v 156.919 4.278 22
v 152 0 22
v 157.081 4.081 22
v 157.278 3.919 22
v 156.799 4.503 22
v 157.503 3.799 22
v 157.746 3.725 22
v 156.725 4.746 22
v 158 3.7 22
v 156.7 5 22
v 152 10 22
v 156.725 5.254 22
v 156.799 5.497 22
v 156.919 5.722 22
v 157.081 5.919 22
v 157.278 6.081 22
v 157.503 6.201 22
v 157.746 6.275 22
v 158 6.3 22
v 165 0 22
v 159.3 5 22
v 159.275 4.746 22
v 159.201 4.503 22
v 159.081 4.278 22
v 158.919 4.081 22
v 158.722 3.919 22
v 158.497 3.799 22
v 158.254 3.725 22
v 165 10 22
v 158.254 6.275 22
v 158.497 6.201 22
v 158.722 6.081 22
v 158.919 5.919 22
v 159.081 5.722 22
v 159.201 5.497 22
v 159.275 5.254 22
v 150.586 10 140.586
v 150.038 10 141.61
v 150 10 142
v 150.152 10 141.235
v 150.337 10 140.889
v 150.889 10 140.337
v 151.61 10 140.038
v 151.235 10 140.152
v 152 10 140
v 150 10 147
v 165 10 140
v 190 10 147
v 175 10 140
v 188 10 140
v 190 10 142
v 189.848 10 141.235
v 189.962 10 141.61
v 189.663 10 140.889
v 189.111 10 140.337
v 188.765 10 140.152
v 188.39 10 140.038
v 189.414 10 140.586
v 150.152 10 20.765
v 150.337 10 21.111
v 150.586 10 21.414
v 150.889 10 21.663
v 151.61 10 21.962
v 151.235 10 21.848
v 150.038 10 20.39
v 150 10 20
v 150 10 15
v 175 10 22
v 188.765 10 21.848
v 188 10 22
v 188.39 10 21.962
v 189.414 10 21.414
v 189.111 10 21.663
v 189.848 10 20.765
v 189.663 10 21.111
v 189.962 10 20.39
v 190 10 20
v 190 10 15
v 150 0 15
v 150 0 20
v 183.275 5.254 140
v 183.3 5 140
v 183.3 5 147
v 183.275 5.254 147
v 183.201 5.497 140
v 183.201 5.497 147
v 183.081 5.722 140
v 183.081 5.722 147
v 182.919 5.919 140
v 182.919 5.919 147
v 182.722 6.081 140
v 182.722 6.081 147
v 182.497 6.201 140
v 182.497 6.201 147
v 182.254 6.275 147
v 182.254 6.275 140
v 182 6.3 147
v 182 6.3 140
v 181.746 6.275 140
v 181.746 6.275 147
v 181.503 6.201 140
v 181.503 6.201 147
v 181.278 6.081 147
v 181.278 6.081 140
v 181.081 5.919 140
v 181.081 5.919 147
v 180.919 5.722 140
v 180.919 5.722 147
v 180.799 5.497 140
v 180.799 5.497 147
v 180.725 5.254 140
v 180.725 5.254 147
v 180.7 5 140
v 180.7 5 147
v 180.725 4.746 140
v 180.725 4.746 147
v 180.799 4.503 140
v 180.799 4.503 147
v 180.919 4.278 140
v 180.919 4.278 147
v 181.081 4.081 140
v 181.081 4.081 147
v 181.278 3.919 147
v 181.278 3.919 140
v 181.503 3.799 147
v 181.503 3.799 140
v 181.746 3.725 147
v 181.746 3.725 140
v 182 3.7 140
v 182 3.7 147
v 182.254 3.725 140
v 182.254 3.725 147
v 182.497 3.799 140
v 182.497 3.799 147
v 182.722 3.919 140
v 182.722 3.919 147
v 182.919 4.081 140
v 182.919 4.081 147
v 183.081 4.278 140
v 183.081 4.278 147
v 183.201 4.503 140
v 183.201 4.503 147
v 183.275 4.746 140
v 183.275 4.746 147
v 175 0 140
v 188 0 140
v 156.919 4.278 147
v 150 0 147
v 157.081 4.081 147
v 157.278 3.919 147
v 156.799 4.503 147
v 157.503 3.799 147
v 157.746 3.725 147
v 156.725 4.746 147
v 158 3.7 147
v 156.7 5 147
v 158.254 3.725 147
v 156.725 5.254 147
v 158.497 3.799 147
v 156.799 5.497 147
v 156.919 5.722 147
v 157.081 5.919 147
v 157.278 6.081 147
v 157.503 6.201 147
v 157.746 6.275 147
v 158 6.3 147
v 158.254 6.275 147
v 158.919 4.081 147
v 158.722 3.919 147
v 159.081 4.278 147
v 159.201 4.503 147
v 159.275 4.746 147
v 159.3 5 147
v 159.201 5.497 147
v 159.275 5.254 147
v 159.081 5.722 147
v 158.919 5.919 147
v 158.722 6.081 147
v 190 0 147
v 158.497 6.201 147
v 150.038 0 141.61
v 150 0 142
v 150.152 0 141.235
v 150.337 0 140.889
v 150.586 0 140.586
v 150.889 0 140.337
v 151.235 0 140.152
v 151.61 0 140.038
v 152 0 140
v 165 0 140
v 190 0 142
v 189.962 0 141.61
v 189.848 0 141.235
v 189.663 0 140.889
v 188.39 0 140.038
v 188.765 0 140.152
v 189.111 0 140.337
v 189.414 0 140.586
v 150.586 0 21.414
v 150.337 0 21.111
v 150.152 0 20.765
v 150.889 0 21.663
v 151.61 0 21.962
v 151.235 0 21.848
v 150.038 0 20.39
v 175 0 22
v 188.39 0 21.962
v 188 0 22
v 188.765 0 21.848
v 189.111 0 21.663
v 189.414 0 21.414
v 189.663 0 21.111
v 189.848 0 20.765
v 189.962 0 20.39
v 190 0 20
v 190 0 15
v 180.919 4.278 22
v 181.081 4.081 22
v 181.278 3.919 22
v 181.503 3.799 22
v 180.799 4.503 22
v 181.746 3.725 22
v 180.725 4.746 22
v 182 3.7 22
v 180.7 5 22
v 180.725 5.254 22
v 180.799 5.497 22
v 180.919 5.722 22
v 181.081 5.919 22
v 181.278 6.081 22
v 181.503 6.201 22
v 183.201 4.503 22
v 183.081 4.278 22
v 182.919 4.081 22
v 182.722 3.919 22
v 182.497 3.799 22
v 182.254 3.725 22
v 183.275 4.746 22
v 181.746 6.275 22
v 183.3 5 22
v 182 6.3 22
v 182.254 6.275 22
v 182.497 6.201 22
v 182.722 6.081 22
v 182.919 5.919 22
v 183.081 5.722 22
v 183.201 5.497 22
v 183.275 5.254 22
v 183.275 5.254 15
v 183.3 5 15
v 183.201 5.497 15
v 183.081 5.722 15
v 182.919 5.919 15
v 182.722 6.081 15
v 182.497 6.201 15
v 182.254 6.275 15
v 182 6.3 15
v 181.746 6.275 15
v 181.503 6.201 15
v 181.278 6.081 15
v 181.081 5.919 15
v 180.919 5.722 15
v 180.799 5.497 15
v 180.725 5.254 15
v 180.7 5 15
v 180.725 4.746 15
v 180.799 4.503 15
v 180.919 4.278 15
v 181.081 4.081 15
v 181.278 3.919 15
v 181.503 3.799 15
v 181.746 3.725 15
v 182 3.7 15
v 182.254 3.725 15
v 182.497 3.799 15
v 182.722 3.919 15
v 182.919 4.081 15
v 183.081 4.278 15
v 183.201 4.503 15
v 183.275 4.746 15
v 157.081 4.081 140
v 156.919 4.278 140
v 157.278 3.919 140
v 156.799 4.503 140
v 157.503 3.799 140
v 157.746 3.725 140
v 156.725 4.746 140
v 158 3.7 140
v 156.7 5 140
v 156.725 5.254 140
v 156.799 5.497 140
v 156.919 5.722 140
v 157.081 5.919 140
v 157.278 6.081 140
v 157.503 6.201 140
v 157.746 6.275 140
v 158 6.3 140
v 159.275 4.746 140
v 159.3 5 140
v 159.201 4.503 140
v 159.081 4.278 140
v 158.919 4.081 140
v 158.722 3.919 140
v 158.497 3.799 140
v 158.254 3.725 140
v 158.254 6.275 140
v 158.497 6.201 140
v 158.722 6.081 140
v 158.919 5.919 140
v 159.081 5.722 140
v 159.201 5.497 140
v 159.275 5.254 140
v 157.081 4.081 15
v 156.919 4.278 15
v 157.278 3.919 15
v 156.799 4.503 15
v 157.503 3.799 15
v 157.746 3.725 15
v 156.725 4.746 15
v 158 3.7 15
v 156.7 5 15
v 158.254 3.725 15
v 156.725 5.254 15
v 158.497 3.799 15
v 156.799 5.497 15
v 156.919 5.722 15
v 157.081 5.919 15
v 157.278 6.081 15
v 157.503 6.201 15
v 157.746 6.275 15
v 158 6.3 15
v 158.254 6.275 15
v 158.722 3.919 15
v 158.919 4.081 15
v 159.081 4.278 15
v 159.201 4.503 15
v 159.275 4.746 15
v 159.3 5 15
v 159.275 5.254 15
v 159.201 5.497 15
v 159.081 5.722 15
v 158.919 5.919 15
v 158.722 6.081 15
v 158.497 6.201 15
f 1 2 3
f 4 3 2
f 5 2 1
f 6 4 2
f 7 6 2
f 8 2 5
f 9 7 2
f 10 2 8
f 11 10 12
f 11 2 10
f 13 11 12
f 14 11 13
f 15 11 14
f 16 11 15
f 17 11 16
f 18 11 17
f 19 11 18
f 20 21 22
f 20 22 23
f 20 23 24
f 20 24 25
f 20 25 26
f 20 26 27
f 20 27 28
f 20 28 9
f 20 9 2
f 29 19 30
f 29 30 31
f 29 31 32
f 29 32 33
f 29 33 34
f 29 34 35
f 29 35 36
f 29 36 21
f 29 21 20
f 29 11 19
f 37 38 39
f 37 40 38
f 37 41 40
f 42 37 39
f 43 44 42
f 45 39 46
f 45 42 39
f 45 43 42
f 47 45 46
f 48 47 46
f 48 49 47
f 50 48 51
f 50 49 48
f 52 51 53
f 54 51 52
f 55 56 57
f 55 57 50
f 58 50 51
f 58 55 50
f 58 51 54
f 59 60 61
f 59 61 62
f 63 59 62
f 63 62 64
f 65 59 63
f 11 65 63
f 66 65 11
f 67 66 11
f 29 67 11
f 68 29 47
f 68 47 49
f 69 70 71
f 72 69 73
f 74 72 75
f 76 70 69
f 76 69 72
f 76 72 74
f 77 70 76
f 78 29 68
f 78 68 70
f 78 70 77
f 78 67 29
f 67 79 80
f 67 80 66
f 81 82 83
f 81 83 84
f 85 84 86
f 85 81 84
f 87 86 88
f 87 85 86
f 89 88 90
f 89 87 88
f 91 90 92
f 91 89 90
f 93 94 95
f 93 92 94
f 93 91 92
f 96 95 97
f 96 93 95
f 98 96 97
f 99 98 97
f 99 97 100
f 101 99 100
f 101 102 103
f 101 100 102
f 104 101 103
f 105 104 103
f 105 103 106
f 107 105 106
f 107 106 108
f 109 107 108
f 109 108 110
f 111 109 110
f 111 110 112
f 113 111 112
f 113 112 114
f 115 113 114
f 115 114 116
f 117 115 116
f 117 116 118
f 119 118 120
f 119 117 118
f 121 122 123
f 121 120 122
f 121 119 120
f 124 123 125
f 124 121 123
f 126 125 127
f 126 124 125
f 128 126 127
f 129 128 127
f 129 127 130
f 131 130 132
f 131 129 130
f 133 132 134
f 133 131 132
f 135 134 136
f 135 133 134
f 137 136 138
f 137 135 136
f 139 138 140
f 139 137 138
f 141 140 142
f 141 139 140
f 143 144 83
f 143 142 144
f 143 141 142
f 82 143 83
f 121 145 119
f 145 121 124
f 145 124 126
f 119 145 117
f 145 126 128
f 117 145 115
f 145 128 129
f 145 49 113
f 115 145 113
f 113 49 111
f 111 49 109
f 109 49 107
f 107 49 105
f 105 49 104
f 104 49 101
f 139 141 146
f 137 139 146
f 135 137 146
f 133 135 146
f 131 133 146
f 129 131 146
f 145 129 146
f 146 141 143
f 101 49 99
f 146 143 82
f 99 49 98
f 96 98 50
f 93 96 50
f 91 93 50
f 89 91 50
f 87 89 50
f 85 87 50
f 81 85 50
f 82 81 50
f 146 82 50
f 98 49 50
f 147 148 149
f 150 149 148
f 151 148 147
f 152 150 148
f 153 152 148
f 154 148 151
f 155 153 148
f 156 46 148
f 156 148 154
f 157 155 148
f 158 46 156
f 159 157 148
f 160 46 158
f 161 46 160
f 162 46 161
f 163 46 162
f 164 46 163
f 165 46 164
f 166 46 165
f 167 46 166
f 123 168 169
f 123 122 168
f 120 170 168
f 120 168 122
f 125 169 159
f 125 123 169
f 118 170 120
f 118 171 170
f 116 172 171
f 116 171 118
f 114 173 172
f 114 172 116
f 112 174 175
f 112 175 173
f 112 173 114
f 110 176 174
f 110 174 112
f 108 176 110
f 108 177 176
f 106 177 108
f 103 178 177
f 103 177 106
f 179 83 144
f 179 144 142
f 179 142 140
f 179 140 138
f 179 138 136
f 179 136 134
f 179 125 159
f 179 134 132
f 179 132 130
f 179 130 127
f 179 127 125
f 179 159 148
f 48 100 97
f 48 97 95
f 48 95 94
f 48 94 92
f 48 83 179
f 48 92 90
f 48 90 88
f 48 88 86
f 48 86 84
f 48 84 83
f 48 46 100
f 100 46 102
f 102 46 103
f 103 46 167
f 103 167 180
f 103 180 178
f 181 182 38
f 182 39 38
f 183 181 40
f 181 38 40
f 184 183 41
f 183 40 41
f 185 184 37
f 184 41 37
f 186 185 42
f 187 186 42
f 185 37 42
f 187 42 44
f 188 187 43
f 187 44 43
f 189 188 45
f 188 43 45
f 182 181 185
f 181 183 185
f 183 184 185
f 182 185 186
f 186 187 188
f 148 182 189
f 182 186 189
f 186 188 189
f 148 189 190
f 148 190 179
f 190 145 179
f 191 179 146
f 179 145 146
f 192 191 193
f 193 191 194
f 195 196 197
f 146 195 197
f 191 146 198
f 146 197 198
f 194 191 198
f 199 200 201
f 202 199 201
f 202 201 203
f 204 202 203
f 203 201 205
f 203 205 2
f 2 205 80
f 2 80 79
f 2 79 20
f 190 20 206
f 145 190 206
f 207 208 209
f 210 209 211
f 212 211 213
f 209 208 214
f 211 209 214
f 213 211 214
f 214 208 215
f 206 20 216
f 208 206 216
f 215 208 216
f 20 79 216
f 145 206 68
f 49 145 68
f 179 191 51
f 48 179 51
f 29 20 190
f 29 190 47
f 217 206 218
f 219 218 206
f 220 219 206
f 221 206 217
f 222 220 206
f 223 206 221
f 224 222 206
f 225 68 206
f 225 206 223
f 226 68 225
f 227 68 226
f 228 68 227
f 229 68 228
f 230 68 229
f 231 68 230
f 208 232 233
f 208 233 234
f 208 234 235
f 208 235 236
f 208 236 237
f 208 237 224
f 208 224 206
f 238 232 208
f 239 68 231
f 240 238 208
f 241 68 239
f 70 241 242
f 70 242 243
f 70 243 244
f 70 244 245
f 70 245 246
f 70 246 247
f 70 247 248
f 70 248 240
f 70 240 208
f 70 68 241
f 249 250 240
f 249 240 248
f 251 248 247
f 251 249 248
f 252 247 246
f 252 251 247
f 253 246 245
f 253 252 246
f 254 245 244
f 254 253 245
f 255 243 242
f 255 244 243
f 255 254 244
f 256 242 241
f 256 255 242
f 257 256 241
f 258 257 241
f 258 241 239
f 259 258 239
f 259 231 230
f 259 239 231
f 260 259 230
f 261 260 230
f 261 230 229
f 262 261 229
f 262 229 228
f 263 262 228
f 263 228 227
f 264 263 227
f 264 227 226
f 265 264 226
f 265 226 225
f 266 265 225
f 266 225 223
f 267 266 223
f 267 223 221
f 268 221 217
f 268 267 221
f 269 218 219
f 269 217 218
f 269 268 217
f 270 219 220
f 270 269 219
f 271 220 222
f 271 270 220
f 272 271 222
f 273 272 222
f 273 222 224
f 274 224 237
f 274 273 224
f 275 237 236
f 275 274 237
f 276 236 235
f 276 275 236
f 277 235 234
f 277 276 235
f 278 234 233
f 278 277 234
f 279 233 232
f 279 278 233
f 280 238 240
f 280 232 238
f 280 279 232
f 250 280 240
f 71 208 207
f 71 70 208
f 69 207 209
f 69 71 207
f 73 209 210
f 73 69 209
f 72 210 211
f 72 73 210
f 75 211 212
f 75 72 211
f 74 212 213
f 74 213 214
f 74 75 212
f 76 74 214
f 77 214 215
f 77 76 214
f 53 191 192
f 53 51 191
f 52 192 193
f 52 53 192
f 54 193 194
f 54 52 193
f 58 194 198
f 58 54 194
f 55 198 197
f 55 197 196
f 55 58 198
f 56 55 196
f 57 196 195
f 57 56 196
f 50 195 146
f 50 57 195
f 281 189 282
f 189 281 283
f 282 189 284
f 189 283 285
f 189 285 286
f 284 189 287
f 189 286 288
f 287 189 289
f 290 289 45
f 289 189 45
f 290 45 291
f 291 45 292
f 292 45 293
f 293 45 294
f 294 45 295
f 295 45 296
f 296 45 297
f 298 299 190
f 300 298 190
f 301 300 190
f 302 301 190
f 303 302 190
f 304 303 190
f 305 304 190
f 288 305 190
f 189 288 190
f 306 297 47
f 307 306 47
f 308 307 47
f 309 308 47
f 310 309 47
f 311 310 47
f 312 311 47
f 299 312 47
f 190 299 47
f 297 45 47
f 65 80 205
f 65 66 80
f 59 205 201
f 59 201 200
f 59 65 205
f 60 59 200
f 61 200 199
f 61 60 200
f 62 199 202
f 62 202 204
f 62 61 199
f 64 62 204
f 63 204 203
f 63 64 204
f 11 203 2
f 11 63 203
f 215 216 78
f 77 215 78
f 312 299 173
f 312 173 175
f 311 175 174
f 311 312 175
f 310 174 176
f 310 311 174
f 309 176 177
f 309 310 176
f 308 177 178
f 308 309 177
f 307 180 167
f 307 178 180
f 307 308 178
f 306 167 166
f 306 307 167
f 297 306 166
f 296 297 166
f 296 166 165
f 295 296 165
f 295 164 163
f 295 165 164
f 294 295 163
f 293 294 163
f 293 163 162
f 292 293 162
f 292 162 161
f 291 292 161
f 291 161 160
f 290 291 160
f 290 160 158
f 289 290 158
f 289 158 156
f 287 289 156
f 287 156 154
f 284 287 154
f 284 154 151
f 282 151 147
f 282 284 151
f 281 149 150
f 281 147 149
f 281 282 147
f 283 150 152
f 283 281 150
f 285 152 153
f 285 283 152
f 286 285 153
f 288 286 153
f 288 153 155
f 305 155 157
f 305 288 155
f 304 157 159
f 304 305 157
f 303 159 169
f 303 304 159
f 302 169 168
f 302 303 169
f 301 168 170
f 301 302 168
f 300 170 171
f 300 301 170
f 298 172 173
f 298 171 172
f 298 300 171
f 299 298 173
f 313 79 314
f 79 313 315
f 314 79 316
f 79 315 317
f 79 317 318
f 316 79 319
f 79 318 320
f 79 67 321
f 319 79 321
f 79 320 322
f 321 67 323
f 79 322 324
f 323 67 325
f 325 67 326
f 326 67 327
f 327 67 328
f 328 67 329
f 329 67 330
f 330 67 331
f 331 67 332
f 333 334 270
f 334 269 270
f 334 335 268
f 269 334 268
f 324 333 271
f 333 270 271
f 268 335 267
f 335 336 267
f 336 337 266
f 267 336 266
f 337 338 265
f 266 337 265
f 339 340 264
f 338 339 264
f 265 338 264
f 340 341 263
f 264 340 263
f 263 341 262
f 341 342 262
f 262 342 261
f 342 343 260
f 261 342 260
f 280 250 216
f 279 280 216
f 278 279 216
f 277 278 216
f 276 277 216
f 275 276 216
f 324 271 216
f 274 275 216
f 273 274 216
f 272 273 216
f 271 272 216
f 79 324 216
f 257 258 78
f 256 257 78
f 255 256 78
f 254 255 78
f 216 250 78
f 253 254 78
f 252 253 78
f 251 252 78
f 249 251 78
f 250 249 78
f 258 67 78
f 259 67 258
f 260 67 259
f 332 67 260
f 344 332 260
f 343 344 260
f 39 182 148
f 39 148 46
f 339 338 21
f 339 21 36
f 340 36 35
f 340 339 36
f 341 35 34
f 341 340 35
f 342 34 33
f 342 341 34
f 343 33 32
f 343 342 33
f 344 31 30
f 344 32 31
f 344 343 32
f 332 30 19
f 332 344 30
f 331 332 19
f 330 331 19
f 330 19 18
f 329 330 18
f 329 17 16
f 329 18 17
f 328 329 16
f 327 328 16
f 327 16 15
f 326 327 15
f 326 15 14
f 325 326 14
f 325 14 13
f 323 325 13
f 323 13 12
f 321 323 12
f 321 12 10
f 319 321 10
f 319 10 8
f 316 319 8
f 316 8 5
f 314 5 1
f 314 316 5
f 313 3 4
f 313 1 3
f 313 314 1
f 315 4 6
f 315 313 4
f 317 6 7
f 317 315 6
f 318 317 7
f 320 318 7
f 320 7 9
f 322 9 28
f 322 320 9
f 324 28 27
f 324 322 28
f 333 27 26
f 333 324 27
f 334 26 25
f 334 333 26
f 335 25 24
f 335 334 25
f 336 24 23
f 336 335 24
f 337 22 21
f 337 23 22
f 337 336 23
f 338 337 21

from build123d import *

# Parameters (mm, degrees)
CYLINDER010_R     = 1.3
CYLINDER010_DEPTH = 146
CYLINDER008_R     = 1.3
CYLINDER008_DEPTH = 146
BOX067_W          = 15
BOX067_H          = 10
BOX067_DEPTH      = 7
BOX068_W          = 10
BOX068_H          = 10
BOX068_DEPTH      = 132
BOX070_W          = 15
BOX070_H          = 10
BOX070_DEPTH      = 7
BOX071_W          = 15
BOX071_H          = 10
BOX071_DEPTH      = 7
BOX069_W          = 15
BOX069_H          = 10
BOX069_DEPTH      = 7
FILLET001_R       = 2


with BuildPart() as cilindro010:
    # Cylinder010 → Cylinder010 (new body)
    with BuildSketch(Plane(origin=(182, 5, 8), x_dir=(1, 0, 0), z_dir=(0, 0, 1))):
        Circle(CYLINDER010_R)
    extrude(amount=CYLINDER010_DEPTH)


with BuildPart() as cilindro008:
    # Cylinder008 → Cylinder008 (new body)
    with BuildSketch(Plane(origin=(158, 5, 8), x_dir=(1, 0, 0), z_dir=(0, 0, 1))):
        Circle(CYLINDER008_R)
    extrude(amount=CYLINDER008_DEPTH)


with BuildPart() as cubo030:
    # Box067 → Box067 (new body)
    with BuildSketch(Plane(origin=(175, 0, 15), x_dir=(1, 0, 0), z_dir=(0, 0, 1))):
        with Locations((7.5, 5)):
            Rectangle(BOX067_W, BOX067_H)
    extrude(amount=BOX067_DEPTH)


with BuildPart() as cubo031:
    # Box068 → Box068 (new body)
    with BuildSketch(Plane(origin=(165, 0, 15), x_dir=(1, 0, 0), z_dir=(0, 0, 1))):
        with Locations((5, 5)):
            Rectangle(BOX068_W, BOX068_H)
    extrude(amount=BOX068_DEPTH)


with BuildPart() as cubo033:
    # Box070 → Box070 (new body)
    with BuildSketch(Plane(origin=(150, 0, 15), x_dir=(1, 0, 0), z_dir=(0, 0, 1))):
        with Locations((7.5, 5)):
            Rectangle(BOX070_W, BOX070_H)
    extrude(amount=BOX070_DEPTH)


with BuildPart() as cubo034:
    # Box071 → Box071 (new body)
    with BuildSketch(Plane(origin=(150, 0, 140), x_dir=(1, 0, 0), z_dir=(0, 0, 1))):
        with Locations((7.5, 5)):
            Rectangle(BOX071_W, BOX071_H)
    extrude(amount=BOX071_DEPTH)


with BuildPart() as pilar002:
    # Box069 → Box069 (new body)
    with BuildSketch(Plane(origin=(175, 0, 140), x_dir=(1, 0, 0), z_dir=(0, 0, 1))):
        with Locations((7.5, 5)):
            Rectangle(BOX069_W, BOX069_H)
    extrude(amount=BOX069_DEPTH)

    # Fusion009: union Cubo030, Cubo031, Cubo033, Cubo034
    add(cubo030.part)
    add(cubo031.part)
    add(cubo033.part)
    add(cubo034.part)

    # Fillet001
    fillet001_edges = [pilar002.edges().sort_by_distance(p)[0] for p in [
        (190, 5, 140),
        (190, 5, 22),
        (150, 5, 22),
        (150, 5, 140),
    ]]
    fillet(fillet001_edges, radius=FILLET001_R)

    # Cut022: cut Cilindro008
    add(cilindro008.part, mode=Mode.SUBTRACT)

    # Cut025: cut Cilindro010
    add(cilindro010.part, mode=Mode.SUBTRACT)


solid = pilar002.part
